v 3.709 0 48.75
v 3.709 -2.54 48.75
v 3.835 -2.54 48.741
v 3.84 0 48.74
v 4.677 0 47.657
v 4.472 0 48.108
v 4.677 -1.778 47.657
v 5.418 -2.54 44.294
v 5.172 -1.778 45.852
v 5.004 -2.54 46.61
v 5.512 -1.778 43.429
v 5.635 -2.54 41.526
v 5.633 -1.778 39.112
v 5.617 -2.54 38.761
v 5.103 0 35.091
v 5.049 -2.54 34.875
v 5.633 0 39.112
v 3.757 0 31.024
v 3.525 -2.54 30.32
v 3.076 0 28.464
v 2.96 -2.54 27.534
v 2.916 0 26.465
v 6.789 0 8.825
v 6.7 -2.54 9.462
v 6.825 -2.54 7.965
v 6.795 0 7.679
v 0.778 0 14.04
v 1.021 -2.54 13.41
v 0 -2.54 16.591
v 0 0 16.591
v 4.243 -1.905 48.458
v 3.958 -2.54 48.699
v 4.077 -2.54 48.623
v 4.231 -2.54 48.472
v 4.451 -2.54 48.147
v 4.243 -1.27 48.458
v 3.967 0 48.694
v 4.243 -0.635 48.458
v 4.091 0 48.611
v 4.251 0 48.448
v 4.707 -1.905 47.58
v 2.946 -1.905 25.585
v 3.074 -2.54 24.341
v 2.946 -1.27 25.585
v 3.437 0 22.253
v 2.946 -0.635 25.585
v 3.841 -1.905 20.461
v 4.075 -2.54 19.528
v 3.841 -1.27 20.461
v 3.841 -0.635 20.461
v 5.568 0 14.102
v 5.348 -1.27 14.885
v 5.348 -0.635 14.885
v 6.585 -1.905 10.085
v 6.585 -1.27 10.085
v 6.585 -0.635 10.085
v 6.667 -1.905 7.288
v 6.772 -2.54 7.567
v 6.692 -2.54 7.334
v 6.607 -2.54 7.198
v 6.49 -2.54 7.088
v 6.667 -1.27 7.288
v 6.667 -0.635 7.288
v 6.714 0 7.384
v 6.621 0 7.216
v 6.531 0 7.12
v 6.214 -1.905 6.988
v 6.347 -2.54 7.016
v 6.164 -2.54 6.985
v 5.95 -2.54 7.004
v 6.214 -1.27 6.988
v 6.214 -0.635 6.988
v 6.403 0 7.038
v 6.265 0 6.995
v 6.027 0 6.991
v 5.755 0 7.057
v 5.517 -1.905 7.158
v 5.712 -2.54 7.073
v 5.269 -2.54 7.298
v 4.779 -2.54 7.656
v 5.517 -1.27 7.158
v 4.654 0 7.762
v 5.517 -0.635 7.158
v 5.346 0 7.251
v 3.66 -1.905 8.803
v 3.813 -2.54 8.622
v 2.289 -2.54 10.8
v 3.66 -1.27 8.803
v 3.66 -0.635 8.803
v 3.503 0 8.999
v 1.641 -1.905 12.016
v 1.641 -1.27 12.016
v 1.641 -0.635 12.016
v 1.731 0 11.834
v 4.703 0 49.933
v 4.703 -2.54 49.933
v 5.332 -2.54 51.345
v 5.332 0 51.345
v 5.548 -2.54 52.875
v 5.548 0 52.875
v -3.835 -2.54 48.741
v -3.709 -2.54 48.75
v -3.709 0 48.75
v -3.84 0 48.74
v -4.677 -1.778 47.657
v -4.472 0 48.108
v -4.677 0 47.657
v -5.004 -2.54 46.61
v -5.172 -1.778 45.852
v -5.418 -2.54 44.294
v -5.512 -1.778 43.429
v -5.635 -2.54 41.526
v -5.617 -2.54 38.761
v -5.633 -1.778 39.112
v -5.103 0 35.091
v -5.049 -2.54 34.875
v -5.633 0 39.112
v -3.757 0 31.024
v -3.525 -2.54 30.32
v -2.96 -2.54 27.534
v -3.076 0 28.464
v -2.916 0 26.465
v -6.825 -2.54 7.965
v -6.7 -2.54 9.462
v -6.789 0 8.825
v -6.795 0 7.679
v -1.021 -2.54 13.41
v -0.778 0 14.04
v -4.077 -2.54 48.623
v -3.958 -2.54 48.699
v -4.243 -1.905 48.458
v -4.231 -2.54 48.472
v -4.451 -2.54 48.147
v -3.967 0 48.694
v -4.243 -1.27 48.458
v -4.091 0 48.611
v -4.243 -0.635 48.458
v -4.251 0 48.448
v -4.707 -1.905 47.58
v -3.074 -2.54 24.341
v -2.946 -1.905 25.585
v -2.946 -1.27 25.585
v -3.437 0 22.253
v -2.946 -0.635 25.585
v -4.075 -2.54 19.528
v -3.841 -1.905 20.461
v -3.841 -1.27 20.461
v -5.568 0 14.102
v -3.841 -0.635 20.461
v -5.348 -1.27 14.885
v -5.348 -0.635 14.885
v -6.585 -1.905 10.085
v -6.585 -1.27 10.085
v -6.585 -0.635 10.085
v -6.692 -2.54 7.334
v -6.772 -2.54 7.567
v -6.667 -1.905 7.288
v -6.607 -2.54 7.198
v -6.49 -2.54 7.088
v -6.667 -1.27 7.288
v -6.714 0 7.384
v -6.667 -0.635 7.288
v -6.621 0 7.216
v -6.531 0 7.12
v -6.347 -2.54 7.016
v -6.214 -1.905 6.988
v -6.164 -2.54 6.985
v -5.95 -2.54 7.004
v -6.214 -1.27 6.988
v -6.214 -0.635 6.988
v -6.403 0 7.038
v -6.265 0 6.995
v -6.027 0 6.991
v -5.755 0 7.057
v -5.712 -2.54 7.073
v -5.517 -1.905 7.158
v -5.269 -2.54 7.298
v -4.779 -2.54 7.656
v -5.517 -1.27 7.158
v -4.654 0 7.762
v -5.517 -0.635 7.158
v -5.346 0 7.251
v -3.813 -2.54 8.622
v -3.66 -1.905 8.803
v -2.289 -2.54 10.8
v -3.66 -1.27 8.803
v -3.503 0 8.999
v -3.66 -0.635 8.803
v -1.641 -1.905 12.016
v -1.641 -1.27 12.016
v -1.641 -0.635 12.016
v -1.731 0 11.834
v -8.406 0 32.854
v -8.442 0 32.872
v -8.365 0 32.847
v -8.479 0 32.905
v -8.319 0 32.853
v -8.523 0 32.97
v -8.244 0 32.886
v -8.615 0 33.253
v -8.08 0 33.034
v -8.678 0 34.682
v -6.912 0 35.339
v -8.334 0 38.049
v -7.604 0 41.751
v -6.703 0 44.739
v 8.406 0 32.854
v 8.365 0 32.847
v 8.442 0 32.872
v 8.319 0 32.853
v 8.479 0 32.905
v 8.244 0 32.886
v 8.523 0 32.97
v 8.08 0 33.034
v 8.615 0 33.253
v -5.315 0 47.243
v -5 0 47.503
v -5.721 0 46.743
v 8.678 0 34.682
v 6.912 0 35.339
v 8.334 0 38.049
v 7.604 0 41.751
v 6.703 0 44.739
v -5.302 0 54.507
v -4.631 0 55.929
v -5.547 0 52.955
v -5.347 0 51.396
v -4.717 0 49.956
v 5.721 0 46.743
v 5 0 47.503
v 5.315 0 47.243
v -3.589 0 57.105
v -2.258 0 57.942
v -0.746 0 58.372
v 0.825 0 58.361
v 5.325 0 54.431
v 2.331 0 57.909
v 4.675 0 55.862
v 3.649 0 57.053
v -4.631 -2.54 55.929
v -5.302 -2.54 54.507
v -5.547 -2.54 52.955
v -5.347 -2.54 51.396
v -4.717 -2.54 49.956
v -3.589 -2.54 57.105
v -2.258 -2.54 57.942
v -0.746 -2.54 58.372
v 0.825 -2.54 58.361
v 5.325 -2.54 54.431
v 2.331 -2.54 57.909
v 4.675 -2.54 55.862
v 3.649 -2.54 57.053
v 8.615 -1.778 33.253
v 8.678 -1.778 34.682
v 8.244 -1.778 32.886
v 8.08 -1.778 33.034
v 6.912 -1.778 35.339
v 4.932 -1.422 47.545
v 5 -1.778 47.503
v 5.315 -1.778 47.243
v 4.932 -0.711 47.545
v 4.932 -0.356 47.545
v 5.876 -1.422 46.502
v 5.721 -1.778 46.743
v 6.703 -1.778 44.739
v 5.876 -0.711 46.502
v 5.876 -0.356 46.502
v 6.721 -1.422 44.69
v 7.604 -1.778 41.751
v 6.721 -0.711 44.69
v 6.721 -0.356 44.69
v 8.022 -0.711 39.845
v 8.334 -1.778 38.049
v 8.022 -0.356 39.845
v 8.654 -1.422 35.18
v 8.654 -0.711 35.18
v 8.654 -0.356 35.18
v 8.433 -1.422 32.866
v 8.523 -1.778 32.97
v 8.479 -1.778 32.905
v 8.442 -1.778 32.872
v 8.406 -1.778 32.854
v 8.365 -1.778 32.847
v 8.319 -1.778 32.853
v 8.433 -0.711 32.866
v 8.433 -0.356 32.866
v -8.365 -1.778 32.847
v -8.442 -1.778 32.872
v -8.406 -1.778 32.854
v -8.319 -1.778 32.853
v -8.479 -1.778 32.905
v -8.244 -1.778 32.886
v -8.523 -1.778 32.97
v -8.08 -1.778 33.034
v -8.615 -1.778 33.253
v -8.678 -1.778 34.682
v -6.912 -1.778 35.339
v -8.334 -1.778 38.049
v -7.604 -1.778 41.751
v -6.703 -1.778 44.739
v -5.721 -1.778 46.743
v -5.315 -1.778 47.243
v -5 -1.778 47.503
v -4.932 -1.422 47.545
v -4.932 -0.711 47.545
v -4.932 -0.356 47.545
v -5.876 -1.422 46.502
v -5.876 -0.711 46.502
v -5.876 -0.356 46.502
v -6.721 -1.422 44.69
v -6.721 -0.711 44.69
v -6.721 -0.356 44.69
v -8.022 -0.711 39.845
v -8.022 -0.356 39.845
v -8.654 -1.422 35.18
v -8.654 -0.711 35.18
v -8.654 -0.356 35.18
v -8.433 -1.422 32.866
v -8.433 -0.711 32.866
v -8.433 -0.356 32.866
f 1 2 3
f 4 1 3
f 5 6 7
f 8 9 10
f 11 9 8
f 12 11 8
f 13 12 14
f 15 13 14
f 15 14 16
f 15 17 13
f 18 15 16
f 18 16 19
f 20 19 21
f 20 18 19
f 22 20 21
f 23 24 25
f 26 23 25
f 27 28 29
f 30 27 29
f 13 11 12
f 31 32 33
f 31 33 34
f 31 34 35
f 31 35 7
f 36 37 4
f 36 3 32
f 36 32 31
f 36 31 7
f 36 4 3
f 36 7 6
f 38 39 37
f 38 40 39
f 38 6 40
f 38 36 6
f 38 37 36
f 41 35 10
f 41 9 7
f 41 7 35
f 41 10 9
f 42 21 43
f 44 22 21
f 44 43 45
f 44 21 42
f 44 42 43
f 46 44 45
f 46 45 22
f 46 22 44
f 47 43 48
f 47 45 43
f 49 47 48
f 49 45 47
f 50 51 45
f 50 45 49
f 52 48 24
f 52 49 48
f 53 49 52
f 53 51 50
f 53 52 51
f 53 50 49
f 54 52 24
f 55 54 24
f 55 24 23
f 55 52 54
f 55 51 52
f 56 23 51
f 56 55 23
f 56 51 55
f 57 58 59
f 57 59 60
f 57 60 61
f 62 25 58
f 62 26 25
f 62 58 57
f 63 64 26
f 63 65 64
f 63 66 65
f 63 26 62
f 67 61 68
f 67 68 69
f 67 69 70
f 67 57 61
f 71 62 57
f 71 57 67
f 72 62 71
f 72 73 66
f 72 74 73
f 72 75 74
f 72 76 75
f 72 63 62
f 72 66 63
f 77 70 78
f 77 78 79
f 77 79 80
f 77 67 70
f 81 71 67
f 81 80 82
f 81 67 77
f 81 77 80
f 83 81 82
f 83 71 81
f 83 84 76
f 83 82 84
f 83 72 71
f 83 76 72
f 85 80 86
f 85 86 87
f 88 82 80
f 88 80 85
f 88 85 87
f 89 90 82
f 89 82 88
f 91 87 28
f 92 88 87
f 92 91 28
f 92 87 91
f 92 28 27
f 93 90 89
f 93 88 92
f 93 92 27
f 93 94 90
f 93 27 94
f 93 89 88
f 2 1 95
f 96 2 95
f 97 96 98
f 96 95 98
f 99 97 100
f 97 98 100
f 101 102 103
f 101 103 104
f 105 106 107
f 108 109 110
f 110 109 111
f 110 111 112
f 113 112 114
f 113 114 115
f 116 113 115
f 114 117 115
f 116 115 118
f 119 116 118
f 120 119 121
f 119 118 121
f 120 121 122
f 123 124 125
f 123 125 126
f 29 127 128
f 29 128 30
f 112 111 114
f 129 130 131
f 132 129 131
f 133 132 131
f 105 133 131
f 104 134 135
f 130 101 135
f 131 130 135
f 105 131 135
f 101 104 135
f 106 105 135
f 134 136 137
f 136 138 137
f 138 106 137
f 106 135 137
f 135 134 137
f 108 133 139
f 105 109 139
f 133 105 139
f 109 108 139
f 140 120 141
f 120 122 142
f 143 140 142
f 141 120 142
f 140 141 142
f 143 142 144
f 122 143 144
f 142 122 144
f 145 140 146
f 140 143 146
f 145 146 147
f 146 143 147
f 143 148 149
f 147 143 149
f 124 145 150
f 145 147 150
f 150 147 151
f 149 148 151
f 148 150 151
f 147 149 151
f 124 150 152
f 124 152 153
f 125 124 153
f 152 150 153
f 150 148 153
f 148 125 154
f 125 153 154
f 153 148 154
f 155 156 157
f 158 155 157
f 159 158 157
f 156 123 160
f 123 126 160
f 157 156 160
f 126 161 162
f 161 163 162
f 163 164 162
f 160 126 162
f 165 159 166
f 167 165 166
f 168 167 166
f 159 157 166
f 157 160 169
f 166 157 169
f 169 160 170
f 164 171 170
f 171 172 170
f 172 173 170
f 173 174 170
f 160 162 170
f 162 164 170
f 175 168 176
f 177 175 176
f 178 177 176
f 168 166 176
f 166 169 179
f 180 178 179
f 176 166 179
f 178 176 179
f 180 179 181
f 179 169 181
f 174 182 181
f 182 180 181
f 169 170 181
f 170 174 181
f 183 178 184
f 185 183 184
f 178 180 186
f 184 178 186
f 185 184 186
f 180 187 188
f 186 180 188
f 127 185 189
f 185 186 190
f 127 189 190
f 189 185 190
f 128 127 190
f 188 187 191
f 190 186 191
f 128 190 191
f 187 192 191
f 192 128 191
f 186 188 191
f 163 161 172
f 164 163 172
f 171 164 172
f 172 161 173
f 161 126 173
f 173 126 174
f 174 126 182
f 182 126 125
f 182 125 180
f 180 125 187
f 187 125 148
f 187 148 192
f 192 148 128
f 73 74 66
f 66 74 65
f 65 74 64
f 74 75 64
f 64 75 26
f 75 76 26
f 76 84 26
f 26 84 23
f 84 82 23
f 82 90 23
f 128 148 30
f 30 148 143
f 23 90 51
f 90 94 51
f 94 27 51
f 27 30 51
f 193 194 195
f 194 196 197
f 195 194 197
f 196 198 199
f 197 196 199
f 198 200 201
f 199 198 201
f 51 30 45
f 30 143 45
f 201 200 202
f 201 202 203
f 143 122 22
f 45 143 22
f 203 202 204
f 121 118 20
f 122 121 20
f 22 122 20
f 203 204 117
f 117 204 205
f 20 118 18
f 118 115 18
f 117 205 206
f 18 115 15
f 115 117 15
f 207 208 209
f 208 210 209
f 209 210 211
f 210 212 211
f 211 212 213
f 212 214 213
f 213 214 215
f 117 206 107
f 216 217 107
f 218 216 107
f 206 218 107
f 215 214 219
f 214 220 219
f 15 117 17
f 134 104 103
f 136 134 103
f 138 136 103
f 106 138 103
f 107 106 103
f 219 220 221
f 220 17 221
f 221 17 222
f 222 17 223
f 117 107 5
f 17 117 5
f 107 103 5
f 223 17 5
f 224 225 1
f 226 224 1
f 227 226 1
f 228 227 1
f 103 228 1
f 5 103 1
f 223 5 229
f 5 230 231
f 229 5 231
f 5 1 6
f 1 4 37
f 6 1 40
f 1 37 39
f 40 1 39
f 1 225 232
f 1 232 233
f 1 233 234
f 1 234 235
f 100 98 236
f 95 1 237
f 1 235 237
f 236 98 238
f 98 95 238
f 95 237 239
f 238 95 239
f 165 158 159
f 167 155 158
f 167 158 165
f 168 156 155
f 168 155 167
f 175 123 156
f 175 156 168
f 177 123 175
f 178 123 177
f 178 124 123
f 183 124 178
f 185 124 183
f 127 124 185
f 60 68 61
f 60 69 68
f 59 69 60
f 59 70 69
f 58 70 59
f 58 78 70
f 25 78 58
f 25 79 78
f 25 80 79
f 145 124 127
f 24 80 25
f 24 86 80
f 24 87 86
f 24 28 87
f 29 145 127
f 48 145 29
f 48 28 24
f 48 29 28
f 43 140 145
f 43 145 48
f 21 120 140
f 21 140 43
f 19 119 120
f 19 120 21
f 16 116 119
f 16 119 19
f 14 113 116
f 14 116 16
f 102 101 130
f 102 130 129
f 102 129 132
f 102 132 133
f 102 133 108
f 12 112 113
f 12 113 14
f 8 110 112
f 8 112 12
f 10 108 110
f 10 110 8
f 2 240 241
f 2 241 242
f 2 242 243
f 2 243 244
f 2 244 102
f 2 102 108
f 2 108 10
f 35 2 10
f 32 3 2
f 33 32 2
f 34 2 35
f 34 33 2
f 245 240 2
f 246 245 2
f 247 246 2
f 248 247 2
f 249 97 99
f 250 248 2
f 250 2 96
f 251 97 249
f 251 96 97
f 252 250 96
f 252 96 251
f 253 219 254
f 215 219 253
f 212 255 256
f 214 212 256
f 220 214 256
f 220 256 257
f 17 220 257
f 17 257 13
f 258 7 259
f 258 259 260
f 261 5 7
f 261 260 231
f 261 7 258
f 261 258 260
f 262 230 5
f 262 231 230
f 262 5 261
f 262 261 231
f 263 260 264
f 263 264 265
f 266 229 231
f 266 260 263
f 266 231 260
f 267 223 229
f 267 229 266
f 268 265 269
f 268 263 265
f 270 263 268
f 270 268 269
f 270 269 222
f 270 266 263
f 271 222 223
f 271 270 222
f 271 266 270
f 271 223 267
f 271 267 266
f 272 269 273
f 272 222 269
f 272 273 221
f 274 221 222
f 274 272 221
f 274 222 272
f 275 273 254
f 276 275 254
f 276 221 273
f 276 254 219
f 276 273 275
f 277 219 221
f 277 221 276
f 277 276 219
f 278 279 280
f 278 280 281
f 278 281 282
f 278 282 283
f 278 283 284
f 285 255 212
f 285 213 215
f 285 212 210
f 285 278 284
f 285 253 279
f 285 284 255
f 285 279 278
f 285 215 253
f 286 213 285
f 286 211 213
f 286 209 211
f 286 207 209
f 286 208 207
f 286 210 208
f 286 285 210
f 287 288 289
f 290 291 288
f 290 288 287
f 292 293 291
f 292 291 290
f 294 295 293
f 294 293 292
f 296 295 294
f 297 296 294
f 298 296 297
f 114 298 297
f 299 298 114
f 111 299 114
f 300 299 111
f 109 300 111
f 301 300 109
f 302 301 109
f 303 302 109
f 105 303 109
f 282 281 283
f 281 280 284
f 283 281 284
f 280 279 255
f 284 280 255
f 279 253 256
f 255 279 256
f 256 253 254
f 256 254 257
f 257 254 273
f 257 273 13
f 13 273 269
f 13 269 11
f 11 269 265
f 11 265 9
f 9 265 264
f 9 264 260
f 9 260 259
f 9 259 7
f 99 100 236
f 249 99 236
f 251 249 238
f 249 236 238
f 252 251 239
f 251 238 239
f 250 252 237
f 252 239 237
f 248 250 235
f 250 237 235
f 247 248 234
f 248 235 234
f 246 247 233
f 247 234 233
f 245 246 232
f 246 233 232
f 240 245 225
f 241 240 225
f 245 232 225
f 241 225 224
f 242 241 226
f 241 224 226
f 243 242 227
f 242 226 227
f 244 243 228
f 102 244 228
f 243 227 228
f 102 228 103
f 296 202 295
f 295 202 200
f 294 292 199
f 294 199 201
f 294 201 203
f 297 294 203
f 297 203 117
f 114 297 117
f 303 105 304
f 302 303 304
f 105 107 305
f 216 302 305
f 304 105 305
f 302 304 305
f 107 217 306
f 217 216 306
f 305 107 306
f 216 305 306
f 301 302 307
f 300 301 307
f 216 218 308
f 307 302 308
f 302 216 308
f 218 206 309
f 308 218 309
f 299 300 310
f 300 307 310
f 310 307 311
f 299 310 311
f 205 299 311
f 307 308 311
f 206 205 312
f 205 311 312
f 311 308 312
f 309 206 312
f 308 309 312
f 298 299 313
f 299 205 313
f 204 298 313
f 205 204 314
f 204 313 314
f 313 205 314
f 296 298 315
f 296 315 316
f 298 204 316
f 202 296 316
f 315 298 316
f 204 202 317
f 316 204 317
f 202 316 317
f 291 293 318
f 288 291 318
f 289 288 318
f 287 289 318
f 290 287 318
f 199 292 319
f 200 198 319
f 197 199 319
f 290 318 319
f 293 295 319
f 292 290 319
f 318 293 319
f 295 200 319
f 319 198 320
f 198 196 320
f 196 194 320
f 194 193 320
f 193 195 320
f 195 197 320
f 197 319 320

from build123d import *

# Parameters (mm, degrees)
F1_DEPTH = 2.54
F3_DEPTH = 1.778
F5_DEPTH = 3.175


with BuildPart() as f1:
    # F0 (on Front) → F1 (new body)
    with BuildSketch(Plane.XZ):
        with BuildLine():
            ThreePointArc((3.7092103529, 48.7496855453), (5.0671470477, 50.6167193556), (5.5475241636, 52.8748258948))
            ThreePointArc((5.5475241636, 52.8748258948), (-2.2581065392, 57.9419729425), (-3.7092103529, 48.7496855453))
            add(Edge.make_bspline(
                [(-2.9907241633, 48.2025038464), (-3.2397557383, 48.5425687681), (-3.4815269665, 48.7326116248), (-3.7092103529, 48.7496855453)],
                knots=[0.9739839009, 0.9739839009, 0.9739839009, 0.9739839009, 1, 1, 1, 1], degree=3))
            ThreePointArc((-2.9907241633, 48.2025038464), (0, 47.3273017313), (2.9907241633, 48.2025038464))
            add(Edge.make_bspline(
                [(2.9907241633, 48.2025038464), (3.2397557383, 48.5425687681), (3.4815269665, 48.7326116248), (3.7092103529, 48.7496855453)],
                knots=[0.9739839009, 0.9739839009, 0.9739839009, 0.9739839009, 1, 1, 1, 1], degree=3))
        make_face()
        with BuildLine():
            add(Edge.make_bspline(
                [(-2.9907241633, 48.2025038464), (-3.2397557383, 48.5425687681), (-3.4815269665, 48.7326116248), (-3.7092103529, 48.7496855453)],
                knots=[0.9739839009, 0.9739839009, 0.9739839009, 0.9739839009, 1, 1, 1, 1], degree=3))
            ThreePointArc((-3.7092103529, 48.7496855453), (-3.3611207332, 48.4614494366), (-2.9907241633, 48.2025038464))
        make_face()
        with BuildLine():
            ThreePointArc((-2.9907241633, 48.2025038464), (-3.3611207332, 48.4614494366), (-3.7092103529, 48.7496855453))
            add(Edge.make_bspline(
                [(-3.7092103529, 48.7496855453), (-5.2134349849, 48.8624869767), (-6.9665224437, 34.2023470282), (0.0869990049, 27.7907233929), (-11.1463797548, 0.9426416028), (-1.6939504177, 9.6754793133), (0, 16.5912210941)],
                knots=[0, 0, 0, 0, 0.1718792822, 0.3388196933, 0.5521260112, 0.719135411, 0.719135411, 0.719135411, 0.719135411], degree=3))
            add(Edge.make_bspline(
                [(0, 16.5912210941), (-1.4883559473, 22.6676004864), (-1.0799851415, 31.1223756669), (0, 37.8380047216)],
                knots=[0.719135411, 0.719135411, 0.719135411, 0.719135411, 0.8658749087, 0.8658749087, 0.8658749087, 0.8658749087], degree=3))
            add(Edge.make_bspline(
                [(0, 37.8380047216), (-0.7956692442, 42.7856834341), (-1.9558821397, 46.7893759257), (-2.9907241633, 48.2025038464)],
                knots=[0.8658749087, 0.8658749087, 0.8658749087, 0.8658749087, 0.9739839009, 0.9739839009, 0.9739839009, 0.9739839009], degree=3))
        make_face()
        with BuildLine():
            add(Edge.make_bspline(
                [(3.7092103529, 48.7496855453), (5.2134349849, 48.8624869767), (6.9665224437, 34.2023470282), (-0.0869990049, 27.7907233929), (11.1463797548, 0.9426416028), (1.6939504177, 9.6754793133), (0, 16.5912210941)],
                knots=[0, 0, 0, 0, 0.1718792822, 0.3388196933, 0.5521260112, 0.719135411, 0.719135411, 0.719135411, 0.719135411], degree=3))
            ThreePointArc((3.7092103529, 48.7496855453), (3.3611207332, 48.4614494366), (2.9907241633, 48.2025038464))
            add(Edge.make_bspline(
                [(0, 37.8380047216), (0.7956692442, 42.7856834341), (1.9558821397, 46.7893759257), (2.9907241633, 48.2025038464)],
                knots=[0.8658749087, 0.8658749087, 0.8658749087, 0.8658749087, 0.9739839009, 0.9739839009, 0.9739839009, 0.9739839009], degree=3))
            add(Edge.make_bspline(
                [(0, 16.5912210941), (1.4883559473, 22.6676004864), (1.0799851415, 31.1223756669), (0, 37.8380047216)],
                knots=[0.719135411, 0.719135411, 0.719135411, 0.719135411, 0.8658749087, 0.8658749087, 0.8658749087, 0.8658749087], degree=3))
        make_face()
        with BuildLine():
            ThreePointArc((2.9907241633, 48.2025038464), (3.3611207332, 48.4614494366), (3.7092103529, 48.7496855453))
            add(Edge.make_bspline(
                [(2.9907241633, 48.2025038464), (3.2397557383, 48.5425687681), (3.4815269665, 48.7326116248), (3.7092103529, 48.7496855453)],
                knots=[0.9739839009, 0.9739839009, 0.9739839009, 0.9739839009, 1, 1, 1, 1], degree=3))
        make_face()
        with BuildLine():
            ThreePointArc((2.9907241633, 48.2025038464), (0, 47.3273017313), (-2.9907241633, 48.2025038464))
            add(Edge.make_bspline(
                [(0, 37.8380047216), (-0.7956692442, 42.7856834341), (-1.9558821397, 46.7893759257), (-2.9907241633, 48.2025038464)],
                knots=[0.8658749087, 0.8658749087, 0.8658749087, 0.8658749087, 0.9739839009, 0.9739839009, 0.9739839009, 0.9739839009], degree=3))
            add(Edge.make_bspline(
                [(0, 37.8380047216), (0.7956692442, 42.7856834341), (1.9558821397, 46.7893759257), (2.9907241633, 48.2025038464)],
                knots=[0.8658749087, 0.8658749087, 0.8658749087, 0.8658749087, 0.9739839009, 0.9739839009, 0.9739839009, 0.9739839009], degree=3))
        make_face()
        with BuildLine():
            add(Edge.make_bspline(
                [(0, 16.5912210941), (-1.4883559473, 22.6676004864), (-1.0799851415, 31.1223756669), (0, 37.8380047216)],
                knots=[0.719135411, 0.719135411, 0.719135411, 0.719135411, 0.8658749087, 0.8658749087, 0.8658749087, 0.8658749087], degree=3))
            add(Edge.make_bspline(
                [(0, 16.5912210941), (1.4883559473, 22.6676004864), (1.0799851415, 31.1223756669), (0, 37.8380047216)],
                knots=[0.719135411, 0.719135411, 0.719135411, 0.719135411, 0.8658749087, 0.8658749087, 0.8658749087, 0.8658749087], degree=3))
        make_face()
    extrude(amount=F1_DEPTH)

    # F2 (on Front) → F3 (join)
    with BuildSketch(Plane.XZ):
        with BuildLine():
            add(Edge.make_bspline(
                [(-2.9766794036, 46.5529243472), (-2.81037839, 47.0855158144), (-6.8678972042, 50.8395924164), (-11.0141828945, 22.0518304425), (-3.4722826714, 44.7214617456), (-5.4643228295, 45.9482695744), (-3.1316790274, 46.0565264283), (-2.9766794036, 46.5529243472)],
                knots=[0, 0, 0, 0, 0.1299325031, 0.4708050688, 0.7779578337, 0.8788973761, 1, 1, 1, 1], degree=3))
        make_face()
        with BuildLine():
            add(Edge.make_bspline(
                [(2.9766794036, 46.5529243472), (2.81037839, 47.0855158144), (6.8678972042, 50.8395924164), (11.0141828945, 22.0518304425), (3.4722826714, 44.7214617456), (5.4643228295, 45.9482695744), (3.1316790274, 46.0565264283), (2.9766794036, 46.5529243472)],
                knots=[0, 0, 0, 0, 0.1299325031, 0.4708050688, 0.7779578337, 0.8788973761, 1, 1, 1, 1], degree=3))
        make_face()
    extrude(amount=F3_DEPTH)


with BuildPart() as f5:
    # F4 (on Front) → F5 (new body)
    with BuildSketch(Plane.XZ):
        with BuildLine():
            add(Edge.make_bspline(
                [(0, 43.0366061628), (0.8643144804, 44.4003418497), (1.6647448264, 46.9773033289), (0, 49.4899712503)],
                knots=[0.943280188, 0.943280188, 0.943280188, 0.943280188, 1, 1, 1, 1], degree=3))
            add(Edge.make_bspline(
                [(0, 43.0366061628), (-0.8643144804, 44.4003418497), (-1.6647448264, 46.9773033289), (0, 49.4899712503)],
                knots=[0.943280188, 0.943280188, 0.943280188, 0.943280188, 1, 1, 1, 1], degree=3))
        make_face()
        with BuildLine():
            add(Edge.make_bspline(
                [(0, 43.0366061628), (-0.8643144804, 44.4003418497), (-1.6647448264, 46.9773033289), (0, 49.4899712503)],
                knots=[0.943280188, 0.943280188, 0.943280188, 0.943280188, 1, 1, 1, 1], degree=3))
            add(Edge.make_bspline(
                [(0, 49.4899712503), (-2.2231687437, 52.8454913862), (-19.4626691015, 61.2857358657), (-2.5319177673, 4.3203098968), (-11.5812345835, 50.1351195221), (-3.4298269541, 14.1483642287), (-9.341972182, 49.4482532476), (-1.2007033383, 12.5482912672), (-7.9621154493, 49.231769969), (-0.0993578774, 17.6327924998), (-5.937169, 48.9375203474), (0.858972439, 16.2878370844), (-2.6565717905, 41.0508920763), (-0.6658187024, 41.9860617765), (0, 43.0366061628)],
                knots=[0, 0, 0, 0, 0.0757459709, 0.1972670057, 0.2828141129, 0.3605634713, 0.4371862329, 0.5170303649, 0.597274528, 0.6697995602, 0.7425321953, 0.8196767058, 0.8995864718, 0.943280188, 0.943280188, 0.943280188, 0.943280188], degree=3))
        make_face()
        with BuildLine():
            add(Edge.make_bspline(
                [(0, 49.4899712503), (2.2231687437, 52.8454913862), (19.4626691015, 61.2857358657), (2.5319177673, 4.3203098968), (11.5812345835, 50.1351195221), (3.4298269541, 14.1483642287), (9.341972182, 49.4482532476), (1.2007033383, 12.5482912672), (7.9621154493, 49.231769969), (0.0993578774, 17.6327924998), (5.937169, 48.9375203474), (-0.858972439, 16.2878370844), (2.6565717905, 41.0508920763), (0.6658187024, 41.9860617765), (0, 43.0366061628)],
                knots=[0, 0, 0, 0, 0.0757459709, 0.1972670057, 0.2828141129, 0.3605634713, 0.4371862329, 0.5170303649, 0.597274528, 0.6697995602, 0.7425321953, 0.8196767058, 0.8995864718, 0.943280188, 0.943280188, 0.943280188, 0.943280188], degree=3))
            add(Edge.make_bspline(
                [(0, 43.0366061628), (0.8643144804, 44.4003418497), (1.6647448264, 46.9773033289), (0, 49.4899712503)],
                knots=[0.943280188, 0.943280188, 0.943280188, 0.943280188, 1, 1, 1, 1], degree=3))
        make_face()
    extrude(amount=-F5_DEPTH)


solid = f1.part
